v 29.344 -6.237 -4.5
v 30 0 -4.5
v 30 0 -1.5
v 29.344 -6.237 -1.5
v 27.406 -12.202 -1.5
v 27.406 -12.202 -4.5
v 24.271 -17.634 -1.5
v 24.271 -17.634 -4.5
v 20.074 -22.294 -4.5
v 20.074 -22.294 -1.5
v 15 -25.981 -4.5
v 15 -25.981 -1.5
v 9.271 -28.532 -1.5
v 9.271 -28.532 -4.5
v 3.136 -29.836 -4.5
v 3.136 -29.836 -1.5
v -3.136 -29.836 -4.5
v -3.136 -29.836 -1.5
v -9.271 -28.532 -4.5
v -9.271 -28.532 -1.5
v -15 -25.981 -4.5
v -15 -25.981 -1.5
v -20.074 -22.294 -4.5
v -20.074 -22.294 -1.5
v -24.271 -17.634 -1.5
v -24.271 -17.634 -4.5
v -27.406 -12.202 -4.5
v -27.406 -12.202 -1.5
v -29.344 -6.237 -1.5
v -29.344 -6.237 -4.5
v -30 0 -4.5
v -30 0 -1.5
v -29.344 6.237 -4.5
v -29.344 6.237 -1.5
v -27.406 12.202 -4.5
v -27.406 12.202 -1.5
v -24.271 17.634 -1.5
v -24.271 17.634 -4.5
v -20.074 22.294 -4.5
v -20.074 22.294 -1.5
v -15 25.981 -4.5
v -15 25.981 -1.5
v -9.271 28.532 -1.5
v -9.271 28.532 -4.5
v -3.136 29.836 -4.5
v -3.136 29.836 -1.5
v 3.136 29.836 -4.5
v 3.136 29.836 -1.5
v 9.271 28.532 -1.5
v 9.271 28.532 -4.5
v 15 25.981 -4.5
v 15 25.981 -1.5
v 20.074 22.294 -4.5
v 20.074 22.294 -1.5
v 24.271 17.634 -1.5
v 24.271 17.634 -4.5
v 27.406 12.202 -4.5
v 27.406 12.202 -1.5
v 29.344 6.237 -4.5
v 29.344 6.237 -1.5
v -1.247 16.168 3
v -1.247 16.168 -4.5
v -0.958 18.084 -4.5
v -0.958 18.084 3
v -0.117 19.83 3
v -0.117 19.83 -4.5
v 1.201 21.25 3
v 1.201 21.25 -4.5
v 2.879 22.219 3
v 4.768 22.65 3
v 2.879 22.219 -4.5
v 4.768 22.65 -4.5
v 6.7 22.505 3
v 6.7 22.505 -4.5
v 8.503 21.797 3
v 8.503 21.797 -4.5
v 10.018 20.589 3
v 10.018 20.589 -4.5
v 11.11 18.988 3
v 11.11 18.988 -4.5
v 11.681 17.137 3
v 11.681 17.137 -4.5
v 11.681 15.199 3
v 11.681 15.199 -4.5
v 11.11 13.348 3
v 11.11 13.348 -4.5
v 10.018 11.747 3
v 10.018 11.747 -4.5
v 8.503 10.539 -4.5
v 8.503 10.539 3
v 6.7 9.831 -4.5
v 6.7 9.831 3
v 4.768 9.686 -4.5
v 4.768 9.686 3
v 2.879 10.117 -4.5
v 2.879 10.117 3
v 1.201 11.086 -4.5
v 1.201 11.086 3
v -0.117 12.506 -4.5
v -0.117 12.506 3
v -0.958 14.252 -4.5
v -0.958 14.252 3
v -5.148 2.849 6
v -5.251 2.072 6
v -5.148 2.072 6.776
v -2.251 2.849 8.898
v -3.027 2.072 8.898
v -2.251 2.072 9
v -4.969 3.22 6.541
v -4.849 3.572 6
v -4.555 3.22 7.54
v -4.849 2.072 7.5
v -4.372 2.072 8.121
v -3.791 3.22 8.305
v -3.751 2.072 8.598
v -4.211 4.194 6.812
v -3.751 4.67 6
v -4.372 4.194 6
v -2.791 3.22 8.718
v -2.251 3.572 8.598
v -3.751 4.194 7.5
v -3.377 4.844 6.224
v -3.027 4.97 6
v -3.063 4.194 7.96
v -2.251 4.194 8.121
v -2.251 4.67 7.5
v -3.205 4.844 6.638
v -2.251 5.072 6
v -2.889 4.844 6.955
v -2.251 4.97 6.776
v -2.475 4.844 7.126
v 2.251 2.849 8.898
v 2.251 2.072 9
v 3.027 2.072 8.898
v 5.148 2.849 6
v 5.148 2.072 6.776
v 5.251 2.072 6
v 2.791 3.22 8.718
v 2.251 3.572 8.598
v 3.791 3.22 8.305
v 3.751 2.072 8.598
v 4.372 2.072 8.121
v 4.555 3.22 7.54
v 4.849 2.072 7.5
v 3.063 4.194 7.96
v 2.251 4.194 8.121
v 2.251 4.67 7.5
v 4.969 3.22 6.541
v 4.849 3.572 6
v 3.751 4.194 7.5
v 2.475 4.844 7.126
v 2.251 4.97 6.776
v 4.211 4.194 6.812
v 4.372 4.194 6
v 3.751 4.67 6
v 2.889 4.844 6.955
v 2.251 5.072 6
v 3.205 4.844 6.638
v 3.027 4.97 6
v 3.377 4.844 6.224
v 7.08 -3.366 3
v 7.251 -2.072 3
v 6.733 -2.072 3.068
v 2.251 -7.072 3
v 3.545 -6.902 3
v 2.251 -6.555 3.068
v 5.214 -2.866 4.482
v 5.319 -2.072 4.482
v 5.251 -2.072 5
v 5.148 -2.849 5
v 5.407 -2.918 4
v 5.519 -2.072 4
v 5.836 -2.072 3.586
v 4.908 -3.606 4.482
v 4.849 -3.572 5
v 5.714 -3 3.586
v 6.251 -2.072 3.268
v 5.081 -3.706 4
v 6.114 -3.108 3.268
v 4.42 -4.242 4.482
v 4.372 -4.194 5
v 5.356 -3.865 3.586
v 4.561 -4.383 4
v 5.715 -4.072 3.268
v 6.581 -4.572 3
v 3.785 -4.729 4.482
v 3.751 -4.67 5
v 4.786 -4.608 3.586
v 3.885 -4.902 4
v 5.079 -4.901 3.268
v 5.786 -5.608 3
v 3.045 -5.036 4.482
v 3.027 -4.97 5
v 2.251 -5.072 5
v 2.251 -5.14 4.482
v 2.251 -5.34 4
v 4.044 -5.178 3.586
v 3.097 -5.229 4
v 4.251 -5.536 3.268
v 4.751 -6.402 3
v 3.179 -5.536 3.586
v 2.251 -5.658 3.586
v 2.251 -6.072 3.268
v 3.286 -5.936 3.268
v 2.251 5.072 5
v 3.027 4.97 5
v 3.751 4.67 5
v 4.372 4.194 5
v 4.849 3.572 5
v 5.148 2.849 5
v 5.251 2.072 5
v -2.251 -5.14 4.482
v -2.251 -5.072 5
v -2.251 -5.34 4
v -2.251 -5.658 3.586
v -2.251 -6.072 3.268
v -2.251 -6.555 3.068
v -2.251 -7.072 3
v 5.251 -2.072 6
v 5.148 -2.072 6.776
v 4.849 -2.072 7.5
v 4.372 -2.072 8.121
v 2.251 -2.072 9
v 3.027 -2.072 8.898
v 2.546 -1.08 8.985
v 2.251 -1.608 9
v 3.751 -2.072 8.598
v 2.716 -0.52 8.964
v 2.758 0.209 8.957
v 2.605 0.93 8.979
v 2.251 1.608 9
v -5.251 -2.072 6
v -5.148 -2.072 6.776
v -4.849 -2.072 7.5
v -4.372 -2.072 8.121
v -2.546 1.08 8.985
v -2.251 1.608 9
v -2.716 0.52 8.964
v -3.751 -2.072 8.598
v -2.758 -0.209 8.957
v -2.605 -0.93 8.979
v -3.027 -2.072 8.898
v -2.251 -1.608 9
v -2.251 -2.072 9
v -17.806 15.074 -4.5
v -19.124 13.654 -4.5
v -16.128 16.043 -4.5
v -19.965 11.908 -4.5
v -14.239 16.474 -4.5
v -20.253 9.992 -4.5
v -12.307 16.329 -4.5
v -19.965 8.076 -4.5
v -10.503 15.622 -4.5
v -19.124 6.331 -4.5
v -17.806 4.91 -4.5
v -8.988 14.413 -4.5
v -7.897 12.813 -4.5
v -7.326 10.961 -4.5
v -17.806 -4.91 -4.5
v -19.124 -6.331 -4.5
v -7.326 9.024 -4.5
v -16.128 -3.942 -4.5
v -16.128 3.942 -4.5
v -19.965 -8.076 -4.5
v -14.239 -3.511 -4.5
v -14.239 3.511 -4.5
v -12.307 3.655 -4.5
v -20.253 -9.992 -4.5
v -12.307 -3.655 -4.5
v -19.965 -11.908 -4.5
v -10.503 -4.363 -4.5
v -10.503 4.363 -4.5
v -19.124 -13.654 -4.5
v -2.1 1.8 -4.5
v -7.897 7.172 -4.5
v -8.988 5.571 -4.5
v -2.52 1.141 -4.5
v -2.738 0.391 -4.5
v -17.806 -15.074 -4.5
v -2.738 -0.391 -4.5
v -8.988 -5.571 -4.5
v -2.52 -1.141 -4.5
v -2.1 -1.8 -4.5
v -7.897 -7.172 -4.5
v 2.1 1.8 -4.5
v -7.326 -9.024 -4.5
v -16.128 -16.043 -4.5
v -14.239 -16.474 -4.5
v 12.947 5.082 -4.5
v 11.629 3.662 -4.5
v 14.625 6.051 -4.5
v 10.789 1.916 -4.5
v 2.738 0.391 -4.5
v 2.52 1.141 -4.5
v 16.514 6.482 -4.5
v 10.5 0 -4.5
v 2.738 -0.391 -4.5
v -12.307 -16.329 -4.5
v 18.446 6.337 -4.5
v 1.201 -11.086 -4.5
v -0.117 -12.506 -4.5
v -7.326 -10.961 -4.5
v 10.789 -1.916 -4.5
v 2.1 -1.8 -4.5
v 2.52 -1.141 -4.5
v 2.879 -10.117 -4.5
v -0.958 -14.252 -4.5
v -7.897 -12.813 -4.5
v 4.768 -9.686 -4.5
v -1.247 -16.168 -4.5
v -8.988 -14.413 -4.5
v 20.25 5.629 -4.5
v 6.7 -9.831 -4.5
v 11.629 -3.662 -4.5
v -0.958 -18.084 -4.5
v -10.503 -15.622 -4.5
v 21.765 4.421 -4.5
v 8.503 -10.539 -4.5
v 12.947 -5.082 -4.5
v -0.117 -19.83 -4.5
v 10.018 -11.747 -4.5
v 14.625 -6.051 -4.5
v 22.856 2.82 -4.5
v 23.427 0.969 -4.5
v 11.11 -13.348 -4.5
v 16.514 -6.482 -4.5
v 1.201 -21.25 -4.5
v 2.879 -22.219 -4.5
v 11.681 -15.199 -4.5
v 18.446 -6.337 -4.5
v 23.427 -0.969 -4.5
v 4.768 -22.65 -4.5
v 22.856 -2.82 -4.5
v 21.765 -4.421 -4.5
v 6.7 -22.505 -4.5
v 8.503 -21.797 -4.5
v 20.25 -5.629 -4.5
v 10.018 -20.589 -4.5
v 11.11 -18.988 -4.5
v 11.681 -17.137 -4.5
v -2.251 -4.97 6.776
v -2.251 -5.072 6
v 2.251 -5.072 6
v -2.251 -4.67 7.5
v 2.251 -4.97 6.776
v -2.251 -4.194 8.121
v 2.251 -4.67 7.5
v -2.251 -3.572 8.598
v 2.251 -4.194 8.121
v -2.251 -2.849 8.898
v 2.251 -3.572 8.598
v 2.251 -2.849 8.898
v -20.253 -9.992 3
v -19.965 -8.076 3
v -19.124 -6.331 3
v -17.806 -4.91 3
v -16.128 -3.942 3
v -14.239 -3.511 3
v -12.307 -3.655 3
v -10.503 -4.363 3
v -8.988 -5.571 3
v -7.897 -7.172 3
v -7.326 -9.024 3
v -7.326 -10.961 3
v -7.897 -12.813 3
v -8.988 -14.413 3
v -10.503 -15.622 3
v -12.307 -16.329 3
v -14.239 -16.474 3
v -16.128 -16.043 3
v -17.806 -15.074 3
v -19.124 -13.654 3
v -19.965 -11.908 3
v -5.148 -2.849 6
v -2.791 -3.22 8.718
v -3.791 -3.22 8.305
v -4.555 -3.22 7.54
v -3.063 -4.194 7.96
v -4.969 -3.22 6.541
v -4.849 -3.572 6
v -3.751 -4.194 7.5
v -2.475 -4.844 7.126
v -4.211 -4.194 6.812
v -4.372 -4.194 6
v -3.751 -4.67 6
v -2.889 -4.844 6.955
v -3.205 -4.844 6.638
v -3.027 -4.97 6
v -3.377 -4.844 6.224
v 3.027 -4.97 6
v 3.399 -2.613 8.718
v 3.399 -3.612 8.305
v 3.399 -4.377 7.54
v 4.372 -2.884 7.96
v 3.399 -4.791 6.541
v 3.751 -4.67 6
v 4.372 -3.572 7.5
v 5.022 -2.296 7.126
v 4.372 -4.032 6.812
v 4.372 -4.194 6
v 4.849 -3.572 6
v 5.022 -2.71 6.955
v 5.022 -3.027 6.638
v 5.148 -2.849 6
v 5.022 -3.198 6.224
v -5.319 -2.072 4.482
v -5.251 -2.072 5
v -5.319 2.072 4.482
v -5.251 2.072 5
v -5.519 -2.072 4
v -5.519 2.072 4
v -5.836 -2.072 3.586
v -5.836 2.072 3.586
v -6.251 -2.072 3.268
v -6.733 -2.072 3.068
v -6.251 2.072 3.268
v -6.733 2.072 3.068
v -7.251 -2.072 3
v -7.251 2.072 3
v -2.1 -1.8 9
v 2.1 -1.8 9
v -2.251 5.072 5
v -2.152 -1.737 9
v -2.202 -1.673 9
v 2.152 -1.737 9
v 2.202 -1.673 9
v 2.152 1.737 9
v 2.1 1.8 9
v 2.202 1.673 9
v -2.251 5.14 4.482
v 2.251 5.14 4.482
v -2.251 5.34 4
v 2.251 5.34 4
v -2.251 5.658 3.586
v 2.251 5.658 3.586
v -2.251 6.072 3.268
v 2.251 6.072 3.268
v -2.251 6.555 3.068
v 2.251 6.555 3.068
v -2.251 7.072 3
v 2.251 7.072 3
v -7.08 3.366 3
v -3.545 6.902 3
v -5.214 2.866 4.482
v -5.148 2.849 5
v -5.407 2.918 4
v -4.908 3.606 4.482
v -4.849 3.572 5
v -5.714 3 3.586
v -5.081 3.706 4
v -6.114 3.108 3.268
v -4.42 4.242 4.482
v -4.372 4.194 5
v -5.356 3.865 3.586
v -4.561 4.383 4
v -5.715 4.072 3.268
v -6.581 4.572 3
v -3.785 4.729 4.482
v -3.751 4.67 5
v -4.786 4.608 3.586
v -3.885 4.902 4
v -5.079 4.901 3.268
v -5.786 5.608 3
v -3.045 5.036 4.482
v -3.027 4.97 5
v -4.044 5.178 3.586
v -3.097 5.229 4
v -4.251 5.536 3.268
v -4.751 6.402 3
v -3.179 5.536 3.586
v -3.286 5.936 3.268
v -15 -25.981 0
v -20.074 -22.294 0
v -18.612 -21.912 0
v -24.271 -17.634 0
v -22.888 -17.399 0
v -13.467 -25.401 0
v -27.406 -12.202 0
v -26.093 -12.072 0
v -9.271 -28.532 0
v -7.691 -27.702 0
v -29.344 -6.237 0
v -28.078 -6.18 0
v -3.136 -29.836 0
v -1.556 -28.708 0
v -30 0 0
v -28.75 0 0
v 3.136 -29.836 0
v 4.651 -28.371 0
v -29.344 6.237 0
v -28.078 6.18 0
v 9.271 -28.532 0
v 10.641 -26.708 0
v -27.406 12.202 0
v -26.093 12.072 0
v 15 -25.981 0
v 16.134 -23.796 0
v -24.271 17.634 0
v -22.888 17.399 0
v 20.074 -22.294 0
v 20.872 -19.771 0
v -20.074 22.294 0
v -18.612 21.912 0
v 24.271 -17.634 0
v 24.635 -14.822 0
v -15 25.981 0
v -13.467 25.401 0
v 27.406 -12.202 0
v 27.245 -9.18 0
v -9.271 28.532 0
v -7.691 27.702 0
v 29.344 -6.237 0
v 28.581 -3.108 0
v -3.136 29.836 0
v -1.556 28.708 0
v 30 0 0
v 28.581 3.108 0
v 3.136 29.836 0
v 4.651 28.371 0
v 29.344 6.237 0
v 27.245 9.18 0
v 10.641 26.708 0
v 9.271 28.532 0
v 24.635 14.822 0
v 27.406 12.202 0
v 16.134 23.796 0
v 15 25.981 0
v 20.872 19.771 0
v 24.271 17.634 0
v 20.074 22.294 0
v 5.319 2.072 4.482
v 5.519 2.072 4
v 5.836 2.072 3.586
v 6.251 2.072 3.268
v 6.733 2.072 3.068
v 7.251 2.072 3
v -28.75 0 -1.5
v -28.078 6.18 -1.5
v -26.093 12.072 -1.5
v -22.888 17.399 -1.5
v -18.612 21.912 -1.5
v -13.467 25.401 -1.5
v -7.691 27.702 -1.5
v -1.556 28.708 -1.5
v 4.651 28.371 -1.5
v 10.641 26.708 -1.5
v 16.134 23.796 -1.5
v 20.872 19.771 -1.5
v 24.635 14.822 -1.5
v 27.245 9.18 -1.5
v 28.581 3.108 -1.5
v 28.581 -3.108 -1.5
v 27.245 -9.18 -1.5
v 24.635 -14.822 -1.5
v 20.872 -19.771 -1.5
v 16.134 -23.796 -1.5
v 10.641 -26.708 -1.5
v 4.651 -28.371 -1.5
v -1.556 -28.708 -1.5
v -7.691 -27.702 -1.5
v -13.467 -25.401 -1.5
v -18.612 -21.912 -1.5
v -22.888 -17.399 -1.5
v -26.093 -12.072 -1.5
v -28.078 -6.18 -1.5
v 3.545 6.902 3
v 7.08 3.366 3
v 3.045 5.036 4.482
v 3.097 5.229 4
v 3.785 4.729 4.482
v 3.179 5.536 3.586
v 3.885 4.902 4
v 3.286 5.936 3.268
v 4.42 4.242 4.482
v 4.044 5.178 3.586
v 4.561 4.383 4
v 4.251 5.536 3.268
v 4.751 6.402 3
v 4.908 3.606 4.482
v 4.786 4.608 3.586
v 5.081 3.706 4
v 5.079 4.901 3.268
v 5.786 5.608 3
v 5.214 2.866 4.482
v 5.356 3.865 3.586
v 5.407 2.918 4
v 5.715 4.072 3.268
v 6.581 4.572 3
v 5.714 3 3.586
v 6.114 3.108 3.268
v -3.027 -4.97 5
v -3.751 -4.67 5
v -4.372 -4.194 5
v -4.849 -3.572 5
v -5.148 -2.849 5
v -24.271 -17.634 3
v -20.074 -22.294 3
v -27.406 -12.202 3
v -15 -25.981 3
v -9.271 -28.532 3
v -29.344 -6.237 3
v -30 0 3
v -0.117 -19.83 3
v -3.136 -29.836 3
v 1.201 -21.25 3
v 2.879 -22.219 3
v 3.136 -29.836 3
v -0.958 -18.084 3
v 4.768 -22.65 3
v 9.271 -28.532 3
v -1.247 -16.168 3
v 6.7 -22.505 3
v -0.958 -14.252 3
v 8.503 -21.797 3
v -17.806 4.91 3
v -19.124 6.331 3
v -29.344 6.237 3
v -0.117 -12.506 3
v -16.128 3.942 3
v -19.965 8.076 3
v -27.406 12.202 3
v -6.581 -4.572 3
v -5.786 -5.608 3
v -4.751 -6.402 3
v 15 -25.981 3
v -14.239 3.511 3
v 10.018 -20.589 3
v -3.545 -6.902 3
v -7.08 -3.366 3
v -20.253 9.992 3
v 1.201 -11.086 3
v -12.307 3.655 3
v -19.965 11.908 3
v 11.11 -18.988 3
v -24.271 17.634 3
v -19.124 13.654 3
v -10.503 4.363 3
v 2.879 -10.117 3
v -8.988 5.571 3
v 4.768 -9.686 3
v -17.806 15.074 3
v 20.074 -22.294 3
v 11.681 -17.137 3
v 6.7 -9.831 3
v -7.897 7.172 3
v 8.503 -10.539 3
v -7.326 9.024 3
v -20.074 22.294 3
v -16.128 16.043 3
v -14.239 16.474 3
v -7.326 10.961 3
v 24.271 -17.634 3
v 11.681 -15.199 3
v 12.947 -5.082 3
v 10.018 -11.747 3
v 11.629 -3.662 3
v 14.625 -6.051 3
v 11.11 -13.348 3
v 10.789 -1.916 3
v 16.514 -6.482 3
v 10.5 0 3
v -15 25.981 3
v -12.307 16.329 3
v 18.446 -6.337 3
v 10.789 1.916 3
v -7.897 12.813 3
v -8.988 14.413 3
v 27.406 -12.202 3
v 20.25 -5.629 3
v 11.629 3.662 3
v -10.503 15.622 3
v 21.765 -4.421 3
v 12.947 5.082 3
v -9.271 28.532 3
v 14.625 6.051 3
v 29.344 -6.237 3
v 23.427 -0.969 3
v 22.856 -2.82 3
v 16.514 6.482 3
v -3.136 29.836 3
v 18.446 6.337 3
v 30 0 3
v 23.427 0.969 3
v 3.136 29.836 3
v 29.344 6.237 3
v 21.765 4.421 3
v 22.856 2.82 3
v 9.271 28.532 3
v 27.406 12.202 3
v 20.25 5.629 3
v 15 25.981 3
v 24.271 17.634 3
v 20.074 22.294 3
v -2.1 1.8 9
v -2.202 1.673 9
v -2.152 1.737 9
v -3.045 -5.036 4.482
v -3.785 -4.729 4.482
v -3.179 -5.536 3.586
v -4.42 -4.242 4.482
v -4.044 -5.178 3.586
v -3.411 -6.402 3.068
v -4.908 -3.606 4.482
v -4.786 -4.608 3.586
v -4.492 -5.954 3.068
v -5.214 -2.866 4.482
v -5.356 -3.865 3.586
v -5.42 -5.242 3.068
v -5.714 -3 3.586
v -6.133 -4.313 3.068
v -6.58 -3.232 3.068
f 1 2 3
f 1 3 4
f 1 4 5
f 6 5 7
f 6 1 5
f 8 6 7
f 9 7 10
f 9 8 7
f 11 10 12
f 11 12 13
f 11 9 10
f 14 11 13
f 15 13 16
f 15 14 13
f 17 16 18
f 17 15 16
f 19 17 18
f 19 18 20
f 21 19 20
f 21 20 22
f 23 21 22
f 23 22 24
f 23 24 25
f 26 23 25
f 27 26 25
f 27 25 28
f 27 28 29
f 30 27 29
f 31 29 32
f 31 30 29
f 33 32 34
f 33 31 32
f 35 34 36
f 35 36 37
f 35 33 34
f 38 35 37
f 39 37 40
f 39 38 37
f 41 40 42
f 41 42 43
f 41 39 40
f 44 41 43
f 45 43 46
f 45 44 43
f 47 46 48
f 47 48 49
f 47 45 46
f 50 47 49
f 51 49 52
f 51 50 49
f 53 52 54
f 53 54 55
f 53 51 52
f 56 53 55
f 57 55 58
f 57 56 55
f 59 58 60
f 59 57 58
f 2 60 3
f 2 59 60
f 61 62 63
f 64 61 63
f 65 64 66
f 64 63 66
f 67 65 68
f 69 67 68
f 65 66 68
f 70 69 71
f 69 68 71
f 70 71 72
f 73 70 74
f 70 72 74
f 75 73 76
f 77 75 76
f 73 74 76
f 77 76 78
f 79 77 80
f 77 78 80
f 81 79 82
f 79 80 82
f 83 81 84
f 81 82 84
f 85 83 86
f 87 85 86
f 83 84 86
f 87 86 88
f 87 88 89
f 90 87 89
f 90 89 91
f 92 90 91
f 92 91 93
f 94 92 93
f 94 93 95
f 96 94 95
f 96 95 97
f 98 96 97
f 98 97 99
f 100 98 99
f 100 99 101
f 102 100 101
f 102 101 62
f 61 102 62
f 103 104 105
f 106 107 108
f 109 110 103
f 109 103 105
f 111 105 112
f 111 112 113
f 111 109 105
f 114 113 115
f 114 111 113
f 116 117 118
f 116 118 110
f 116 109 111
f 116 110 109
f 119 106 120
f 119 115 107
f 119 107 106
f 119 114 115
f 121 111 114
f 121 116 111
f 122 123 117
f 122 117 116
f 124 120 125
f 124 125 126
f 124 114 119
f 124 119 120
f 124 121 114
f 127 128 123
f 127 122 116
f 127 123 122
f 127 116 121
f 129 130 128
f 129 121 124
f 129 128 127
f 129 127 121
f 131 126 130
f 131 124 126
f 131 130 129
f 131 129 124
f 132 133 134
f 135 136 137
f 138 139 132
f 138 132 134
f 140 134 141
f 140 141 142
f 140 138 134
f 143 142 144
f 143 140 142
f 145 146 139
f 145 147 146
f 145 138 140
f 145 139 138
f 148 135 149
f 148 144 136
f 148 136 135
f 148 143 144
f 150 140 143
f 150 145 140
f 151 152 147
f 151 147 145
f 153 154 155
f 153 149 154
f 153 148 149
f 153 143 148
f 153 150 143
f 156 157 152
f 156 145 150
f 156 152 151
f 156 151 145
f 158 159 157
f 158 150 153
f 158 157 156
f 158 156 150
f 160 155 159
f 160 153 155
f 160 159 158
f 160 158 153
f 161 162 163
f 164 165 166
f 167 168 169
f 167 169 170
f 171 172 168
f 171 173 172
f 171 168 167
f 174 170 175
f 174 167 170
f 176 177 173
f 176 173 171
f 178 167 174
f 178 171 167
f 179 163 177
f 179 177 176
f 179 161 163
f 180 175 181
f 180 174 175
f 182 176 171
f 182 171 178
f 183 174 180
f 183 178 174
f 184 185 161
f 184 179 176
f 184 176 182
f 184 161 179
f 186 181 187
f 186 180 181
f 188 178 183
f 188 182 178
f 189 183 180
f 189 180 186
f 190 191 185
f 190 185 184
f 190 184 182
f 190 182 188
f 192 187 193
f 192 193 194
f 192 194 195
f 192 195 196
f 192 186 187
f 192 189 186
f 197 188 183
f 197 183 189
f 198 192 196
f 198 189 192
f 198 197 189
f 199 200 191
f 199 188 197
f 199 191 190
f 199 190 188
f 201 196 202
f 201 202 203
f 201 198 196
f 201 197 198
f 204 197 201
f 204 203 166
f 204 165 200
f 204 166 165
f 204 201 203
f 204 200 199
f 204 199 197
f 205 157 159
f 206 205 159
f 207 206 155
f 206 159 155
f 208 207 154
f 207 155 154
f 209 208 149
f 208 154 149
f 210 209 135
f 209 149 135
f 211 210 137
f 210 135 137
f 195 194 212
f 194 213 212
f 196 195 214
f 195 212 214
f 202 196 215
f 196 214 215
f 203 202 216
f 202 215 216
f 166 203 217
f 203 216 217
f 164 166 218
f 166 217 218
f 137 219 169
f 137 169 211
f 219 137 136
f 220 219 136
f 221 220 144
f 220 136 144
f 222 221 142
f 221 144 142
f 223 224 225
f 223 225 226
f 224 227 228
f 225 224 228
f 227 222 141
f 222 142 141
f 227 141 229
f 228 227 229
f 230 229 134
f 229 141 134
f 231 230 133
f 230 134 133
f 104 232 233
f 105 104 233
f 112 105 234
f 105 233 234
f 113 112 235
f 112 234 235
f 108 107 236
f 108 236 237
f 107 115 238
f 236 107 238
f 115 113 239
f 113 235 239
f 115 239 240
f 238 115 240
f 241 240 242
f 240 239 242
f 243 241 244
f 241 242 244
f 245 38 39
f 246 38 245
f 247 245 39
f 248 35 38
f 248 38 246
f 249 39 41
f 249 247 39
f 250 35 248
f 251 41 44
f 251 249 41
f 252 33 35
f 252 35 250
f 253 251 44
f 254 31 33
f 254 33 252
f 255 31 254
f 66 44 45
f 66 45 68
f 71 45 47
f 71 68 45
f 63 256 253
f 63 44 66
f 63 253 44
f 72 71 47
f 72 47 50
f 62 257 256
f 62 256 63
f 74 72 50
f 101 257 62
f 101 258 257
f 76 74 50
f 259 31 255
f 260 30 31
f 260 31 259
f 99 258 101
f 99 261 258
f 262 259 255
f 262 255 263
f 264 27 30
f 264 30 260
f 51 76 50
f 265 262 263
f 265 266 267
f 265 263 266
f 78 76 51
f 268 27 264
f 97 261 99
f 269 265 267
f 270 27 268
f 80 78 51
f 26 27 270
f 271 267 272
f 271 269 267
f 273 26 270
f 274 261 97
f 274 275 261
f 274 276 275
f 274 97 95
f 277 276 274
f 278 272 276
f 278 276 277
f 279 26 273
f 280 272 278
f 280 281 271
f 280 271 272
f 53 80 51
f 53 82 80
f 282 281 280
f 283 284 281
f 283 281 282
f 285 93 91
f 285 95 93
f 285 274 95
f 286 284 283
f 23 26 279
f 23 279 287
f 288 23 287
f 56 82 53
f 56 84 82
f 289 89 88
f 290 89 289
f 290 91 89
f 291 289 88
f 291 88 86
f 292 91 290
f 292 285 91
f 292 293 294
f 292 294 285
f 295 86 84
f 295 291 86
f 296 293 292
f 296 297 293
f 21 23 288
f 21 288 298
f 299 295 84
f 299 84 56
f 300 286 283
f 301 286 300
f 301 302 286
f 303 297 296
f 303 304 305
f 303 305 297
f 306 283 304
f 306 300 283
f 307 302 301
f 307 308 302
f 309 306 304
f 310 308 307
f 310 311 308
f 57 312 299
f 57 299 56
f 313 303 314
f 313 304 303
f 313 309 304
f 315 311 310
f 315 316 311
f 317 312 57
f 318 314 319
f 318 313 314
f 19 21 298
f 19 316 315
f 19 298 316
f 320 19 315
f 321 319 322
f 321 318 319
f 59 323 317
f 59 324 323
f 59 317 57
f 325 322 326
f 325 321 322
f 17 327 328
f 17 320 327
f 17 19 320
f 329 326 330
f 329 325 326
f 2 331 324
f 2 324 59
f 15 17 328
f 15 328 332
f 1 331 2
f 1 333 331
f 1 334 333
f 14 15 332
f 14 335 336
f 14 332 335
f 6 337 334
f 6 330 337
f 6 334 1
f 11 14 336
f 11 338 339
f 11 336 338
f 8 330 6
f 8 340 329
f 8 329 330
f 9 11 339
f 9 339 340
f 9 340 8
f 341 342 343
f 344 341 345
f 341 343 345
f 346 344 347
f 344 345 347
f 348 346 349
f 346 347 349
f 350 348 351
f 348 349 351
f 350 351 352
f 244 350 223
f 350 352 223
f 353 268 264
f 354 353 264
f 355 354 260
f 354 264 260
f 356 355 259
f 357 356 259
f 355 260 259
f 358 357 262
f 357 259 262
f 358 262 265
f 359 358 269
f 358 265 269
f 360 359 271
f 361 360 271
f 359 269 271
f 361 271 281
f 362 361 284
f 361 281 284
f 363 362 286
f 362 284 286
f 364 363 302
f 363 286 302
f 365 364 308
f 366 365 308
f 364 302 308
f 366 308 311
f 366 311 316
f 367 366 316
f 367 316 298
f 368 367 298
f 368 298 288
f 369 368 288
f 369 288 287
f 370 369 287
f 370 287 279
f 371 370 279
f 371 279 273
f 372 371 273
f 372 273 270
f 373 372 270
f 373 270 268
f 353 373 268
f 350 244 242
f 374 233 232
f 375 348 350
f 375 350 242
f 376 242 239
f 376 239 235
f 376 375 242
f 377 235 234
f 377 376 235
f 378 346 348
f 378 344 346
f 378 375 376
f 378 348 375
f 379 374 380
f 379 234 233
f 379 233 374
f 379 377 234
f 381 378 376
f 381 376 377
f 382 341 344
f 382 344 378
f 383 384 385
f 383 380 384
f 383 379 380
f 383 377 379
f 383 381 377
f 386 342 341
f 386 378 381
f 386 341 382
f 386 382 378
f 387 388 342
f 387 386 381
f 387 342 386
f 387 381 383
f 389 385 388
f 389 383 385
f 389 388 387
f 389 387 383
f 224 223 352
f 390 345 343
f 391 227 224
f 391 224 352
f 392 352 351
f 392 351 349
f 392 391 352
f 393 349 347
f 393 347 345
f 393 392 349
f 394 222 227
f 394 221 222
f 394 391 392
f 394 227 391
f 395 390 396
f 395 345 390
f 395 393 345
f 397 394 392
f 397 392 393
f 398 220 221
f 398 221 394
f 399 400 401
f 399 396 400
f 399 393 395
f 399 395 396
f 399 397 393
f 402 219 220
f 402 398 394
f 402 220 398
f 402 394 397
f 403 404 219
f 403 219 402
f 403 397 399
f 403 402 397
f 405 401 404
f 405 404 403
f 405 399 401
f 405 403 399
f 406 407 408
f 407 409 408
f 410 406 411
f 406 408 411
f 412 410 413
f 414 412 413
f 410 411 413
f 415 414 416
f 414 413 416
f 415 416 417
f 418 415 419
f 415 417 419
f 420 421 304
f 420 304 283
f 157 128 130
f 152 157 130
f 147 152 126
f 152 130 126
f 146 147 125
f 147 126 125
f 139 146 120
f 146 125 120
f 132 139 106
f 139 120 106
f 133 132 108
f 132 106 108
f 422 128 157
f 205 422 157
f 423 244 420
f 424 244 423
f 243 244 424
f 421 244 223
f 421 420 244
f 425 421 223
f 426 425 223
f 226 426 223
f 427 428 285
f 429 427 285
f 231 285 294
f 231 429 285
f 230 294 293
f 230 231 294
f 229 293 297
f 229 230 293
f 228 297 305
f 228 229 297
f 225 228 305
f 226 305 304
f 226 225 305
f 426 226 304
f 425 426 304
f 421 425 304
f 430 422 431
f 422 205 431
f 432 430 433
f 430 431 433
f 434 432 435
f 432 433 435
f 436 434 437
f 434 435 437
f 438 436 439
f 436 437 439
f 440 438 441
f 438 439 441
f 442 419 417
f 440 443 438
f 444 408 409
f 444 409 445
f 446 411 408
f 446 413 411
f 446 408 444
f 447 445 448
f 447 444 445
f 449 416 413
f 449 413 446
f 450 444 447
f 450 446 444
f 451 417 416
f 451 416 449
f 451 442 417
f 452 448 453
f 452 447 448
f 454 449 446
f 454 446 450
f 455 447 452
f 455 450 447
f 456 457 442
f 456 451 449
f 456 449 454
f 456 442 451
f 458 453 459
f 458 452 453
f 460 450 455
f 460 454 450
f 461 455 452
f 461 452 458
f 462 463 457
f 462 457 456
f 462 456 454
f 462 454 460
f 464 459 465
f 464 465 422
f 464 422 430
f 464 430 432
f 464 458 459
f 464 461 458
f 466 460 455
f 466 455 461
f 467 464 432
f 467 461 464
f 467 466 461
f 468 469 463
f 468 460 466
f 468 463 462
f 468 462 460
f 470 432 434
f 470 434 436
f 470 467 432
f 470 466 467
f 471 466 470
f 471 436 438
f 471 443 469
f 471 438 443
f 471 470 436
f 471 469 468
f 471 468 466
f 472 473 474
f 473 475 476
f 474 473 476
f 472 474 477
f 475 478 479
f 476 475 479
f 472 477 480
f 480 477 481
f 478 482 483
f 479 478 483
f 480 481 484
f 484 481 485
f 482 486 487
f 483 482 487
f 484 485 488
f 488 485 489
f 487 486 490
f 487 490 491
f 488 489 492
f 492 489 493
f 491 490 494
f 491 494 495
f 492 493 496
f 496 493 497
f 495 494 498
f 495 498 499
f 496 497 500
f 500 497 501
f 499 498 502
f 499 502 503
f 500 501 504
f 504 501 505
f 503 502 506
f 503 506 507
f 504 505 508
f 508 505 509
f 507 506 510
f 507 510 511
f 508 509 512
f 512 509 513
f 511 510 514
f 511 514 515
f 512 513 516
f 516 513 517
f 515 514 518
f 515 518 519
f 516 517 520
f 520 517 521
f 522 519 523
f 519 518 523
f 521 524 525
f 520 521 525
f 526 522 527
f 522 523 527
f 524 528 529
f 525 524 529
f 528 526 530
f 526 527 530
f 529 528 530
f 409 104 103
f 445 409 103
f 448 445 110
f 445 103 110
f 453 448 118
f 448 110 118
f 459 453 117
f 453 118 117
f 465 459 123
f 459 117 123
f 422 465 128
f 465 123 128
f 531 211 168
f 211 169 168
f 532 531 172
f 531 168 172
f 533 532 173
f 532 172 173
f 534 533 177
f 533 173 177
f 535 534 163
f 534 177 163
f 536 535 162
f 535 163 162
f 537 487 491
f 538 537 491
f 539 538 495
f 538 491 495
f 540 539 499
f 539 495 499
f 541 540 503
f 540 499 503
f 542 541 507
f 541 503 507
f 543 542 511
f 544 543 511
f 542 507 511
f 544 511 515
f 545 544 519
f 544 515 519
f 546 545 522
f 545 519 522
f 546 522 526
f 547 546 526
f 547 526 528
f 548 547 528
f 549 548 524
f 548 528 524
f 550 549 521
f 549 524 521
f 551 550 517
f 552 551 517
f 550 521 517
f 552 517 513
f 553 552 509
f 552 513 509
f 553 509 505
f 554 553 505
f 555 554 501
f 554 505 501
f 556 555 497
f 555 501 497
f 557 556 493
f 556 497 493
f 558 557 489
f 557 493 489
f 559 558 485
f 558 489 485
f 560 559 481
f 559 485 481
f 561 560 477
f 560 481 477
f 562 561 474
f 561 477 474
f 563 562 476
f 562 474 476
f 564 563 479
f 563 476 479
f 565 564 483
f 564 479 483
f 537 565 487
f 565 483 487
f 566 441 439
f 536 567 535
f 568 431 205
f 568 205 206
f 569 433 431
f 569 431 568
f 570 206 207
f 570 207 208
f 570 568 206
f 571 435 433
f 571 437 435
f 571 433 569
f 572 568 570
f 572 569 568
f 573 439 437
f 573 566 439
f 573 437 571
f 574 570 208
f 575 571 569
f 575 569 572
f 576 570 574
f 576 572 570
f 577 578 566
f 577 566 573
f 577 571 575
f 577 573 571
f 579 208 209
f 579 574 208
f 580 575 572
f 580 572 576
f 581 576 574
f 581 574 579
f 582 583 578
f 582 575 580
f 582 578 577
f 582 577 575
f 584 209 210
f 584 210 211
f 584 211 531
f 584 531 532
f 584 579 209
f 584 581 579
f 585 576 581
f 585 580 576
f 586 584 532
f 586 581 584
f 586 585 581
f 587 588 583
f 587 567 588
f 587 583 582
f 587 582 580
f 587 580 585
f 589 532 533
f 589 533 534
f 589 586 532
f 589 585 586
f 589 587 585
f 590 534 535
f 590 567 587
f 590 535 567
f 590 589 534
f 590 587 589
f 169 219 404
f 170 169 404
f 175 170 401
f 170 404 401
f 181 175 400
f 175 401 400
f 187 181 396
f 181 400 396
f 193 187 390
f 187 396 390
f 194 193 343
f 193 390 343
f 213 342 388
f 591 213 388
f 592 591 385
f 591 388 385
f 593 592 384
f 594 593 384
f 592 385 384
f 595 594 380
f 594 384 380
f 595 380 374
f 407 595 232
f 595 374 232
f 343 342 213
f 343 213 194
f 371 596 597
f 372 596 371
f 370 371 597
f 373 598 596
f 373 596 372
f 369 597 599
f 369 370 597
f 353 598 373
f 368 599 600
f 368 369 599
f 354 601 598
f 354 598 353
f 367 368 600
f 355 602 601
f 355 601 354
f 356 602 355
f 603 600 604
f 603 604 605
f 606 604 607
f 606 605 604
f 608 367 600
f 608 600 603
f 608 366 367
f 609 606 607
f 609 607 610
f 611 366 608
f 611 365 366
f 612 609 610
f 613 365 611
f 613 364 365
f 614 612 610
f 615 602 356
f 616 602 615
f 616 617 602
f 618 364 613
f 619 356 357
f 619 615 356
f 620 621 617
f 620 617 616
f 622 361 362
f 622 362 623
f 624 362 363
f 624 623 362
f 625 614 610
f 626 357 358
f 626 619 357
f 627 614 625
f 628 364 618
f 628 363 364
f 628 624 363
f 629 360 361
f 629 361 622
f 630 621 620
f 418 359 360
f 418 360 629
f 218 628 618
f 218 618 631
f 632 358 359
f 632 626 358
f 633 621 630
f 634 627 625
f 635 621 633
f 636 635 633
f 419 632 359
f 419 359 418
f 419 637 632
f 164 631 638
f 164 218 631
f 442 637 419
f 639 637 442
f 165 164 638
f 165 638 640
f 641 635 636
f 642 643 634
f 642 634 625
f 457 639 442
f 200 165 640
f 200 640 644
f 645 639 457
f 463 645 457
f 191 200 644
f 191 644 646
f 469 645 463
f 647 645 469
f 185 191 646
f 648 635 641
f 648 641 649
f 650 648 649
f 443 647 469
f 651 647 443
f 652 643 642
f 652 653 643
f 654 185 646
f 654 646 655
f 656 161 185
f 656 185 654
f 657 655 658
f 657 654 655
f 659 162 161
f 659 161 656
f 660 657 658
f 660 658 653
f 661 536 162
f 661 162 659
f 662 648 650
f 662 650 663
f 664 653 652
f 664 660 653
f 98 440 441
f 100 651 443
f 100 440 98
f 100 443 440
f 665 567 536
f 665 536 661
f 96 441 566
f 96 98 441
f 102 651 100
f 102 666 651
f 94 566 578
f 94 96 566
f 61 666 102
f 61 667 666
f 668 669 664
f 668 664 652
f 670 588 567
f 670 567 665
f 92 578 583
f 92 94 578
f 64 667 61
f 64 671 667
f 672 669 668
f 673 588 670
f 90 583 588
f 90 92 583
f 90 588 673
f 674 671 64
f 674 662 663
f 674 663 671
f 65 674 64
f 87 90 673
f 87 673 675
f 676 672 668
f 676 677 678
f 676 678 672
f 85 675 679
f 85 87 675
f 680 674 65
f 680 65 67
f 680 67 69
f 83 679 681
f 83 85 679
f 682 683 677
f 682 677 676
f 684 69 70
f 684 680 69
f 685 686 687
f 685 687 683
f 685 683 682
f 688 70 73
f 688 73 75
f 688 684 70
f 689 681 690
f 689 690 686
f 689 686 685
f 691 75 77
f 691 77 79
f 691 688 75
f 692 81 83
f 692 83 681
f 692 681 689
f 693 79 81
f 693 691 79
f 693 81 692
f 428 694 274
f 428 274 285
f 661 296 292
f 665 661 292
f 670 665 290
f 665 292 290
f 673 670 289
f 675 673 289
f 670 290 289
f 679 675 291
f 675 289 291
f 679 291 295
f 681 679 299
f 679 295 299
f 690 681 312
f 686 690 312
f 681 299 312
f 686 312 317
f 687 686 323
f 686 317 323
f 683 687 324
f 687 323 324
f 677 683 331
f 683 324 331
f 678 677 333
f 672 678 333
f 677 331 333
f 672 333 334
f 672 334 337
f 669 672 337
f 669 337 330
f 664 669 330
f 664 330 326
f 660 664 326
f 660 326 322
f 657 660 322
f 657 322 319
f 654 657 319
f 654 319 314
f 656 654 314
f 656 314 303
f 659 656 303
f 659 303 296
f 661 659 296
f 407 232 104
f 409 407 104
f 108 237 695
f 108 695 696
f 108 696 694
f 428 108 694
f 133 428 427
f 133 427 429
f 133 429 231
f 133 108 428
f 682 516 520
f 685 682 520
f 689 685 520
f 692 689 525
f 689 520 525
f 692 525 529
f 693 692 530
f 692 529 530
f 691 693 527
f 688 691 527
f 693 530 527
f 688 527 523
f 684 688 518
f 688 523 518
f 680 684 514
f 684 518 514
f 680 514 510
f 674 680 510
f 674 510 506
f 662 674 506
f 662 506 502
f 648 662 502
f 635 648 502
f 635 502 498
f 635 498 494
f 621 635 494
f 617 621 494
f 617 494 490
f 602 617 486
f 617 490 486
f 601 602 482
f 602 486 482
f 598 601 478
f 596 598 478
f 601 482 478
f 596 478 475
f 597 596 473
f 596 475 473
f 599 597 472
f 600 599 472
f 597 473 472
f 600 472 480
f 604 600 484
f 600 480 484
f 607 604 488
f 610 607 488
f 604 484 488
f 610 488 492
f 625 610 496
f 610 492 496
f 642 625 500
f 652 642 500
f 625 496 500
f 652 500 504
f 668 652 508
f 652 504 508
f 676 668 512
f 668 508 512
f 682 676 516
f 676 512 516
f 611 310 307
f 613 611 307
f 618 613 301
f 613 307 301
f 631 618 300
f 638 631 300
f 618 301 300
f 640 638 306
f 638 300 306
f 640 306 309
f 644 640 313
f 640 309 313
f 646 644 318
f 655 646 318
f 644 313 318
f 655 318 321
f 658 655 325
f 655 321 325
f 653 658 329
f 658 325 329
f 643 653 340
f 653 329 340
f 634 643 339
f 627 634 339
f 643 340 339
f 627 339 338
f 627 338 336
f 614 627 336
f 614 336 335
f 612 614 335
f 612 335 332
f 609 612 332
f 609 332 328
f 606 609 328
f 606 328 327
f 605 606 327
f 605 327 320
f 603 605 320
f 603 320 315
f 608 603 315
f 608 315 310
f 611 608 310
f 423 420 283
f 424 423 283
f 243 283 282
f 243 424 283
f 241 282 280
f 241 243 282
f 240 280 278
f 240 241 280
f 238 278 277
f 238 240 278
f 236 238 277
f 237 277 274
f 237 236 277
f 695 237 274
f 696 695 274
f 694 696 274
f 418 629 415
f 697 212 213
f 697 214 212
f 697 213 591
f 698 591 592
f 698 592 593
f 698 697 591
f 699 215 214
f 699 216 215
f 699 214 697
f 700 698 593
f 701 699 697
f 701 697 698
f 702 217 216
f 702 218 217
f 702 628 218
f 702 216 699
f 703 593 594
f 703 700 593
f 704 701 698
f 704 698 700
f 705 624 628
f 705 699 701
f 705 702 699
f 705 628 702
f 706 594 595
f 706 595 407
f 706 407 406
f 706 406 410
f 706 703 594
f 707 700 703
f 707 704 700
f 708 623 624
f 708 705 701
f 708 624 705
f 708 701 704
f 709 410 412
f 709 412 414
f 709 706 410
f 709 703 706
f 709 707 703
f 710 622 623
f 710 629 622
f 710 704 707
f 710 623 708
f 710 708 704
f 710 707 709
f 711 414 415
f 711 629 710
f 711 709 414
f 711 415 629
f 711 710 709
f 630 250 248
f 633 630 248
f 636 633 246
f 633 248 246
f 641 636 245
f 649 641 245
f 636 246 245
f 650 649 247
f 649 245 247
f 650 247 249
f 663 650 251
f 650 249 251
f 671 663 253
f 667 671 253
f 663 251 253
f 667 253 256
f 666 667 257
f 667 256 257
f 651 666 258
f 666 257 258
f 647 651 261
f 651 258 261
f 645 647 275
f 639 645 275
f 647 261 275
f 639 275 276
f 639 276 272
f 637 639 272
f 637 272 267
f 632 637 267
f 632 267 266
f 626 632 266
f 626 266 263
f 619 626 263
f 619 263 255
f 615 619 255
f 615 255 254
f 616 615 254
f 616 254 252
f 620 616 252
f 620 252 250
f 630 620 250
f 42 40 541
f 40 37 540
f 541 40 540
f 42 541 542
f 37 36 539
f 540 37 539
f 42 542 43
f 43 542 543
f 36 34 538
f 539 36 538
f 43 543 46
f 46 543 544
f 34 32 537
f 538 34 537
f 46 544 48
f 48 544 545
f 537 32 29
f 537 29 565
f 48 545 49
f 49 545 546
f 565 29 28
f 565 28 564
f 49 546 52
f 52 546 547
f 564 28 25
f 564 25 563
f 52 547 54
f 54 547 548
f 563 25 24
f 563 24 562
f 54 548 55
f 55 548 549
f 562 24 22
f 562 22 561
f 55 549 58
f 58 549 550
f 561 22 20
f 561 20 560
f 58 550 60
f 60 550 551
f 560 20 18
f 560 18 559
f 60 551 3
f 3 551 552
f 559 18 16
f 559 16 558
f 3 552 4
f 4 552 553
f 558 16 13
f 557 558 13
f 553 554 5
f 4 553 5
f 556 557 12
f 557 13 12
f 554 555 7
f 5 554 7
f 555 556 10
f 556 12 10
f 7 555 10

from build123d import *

# Parameters (mm, degrees)
ESQUISSE2_R             = 30
BOSS_EXTRU_1_DEPTH      = 3
ENL_V_MAT_EXTRU_1_DEPTH = 43.532340636
BOSS_EXTRU_3_START      = 6
ESQUISSE5_W             = 10.501413836
ESQUISSE5_H             = 10.144569676
BOSS_EXTRU_3_DEPTH      = 6
ESQUISSE8_R             = 28.75
BOSS_EXTRU_4_DEPTH      = 1.5
BOSS_EXTRU_5_START      = 3
ESQUISSE9_R             = 30
BOSS_EXTRU_5_DEPTH      = 3
ENL_V_MAT_EXTRU_4_DEPTH = 44.370496884
CONG_1_R                = 3
CONG_2_R                = 2
ESQUISSE11_R            = 6.5
AJOURAGE_DEPTH          = 45.522466269


with BuildPart() as part:
    # Esquisse2 → Boss.-Extru.1 (new body)
    with BuildSketch(Plane.XY):
        Circle(ESQUISSE2_R)
    extrude(amount=BOSS_EXTRU_1_DEPTH)

    # Esquisse4 → Enlèv. mat.-Extru.1 (cut, through all)
    with BuildSketch(Plane.XY.offset(3)):
        with BuildLine():
            Line((-2.1, -1.8), (2.1, -1.8))
            ThreePointArc((2.1, -1.8), (2.765863337, 0), (2.1, 1.8))
            Line((2.1, 1.8), (-2.1, 1.8))
            ThreePointArc((-2.1, 1.8), (-2.765863337, 0), (-2.1, -1.8))
        make_face()
    extrude(amount=-ENL_V_MAT_EXTRU_1_DEPTH, mode=Mode.SUBTRACT)

    # Esquisse5 → Boss.-Extru.3 (add)
    with BuildSketch(Plane.XY.offset(3).offset(BOSS_EXTRU_3_START)):
        Rectangle(ESQUISSE5_W, ESQUISSE5_H)
        with BuildLine():
            Line((-2.1, 1.8), (2.1, 1.8))
            ThreePointArc((2.1, 1.8), (2.765863337, 0), (2.1, -1.8))
            Line((2.1, -1.8), (-2.1, -1.8))
            ThreePointArc((-2.1, -1.8), (-2.765863337, 0), (-2.1, 1.8))
        make_face(mode=Mode.SUBTRACT)
    extrude(amount=-BOSS_EXTRU_3_DEPTH)

    # Esquisse8 → Boss.-Extru.4 (add)
    with BuildSketch(Plane(origin=(0, 0, 0), x_dir=(-1, 0, 0), z_dir=(0, 0, -1))):
        Circle(ESQUISSE8_R)
    extrude(amount=BOSS_EXTRU_4_DEPTH)

    # Esquisse9 → Boss.-Extru.5 (add)
    with BuildSketch(Plane(origin=(0, 0, -1.5), x_dir=(-1, 0, 0), z_dir=(0, 0, -1)).offset(BOSS_EXTRU_5_START)):
        with Locations(Location((0, 0, 0), (0, 0, 180))):
            Circle(ESQUISSE9_R)
    extrude(amount=-BOSS_EXTRU_5_DEPTH)

    # Esquisse10 → Enlèv. mat.-Extru.4 (cut, through all)
    with BuildSketch(Plane.XY):
        with BuildLine():
            Line((-2.1, 1.8), (2.1, 1.8))
            ThreePointArc((2.1, 1.8), (2.765863337, 0), (2.1, -1.8))
            Line((2.1, -1.8), (-2.1, -1.8))
            ThreePointArc((-2.1, -1.8), (-2.765863337, 0), (-2.1, 1.8))
        make_face()
    extrude(amount=-ENL_V_MAT_EXTRU_4_DEPTH, mode=Mode.SUBTRACT)

    # Congé1
    # the kernel refuses this fillet: 3 mm, written as the material it takes off along each edge
    with BuildSketch(Plane(origin=(-2.250706918, -2.072284838, 6), x_dir=(-1, 0, 0), z_dir=(0, -1, 0))) as cong_1_piece_1_section:
        Polygon((0, 0), (CONG_1_R, 0), (CONG_1_R, -CONG_1_R), (0, -CONG_1_R), align=None)
    cong_1_piece_1 = extrude(amount=CONG_1_R, mode=Mode.PRIVATE)
    cong_1_piece_1 = cong_1_piece_1 - Plane(origin=(-2.250706918, -2.072284838, 6), x_dir=(0.7071067811865475, 0, -0.7071067811865475), z_dir=(0, -1, 0)) * Sphere(CONG_1_R, mode=Mode.PRIVATE)
    add(cong_1_piece_1, mode=Mode.SUBTRACT)
    with BuildSketch(Plane(origin=(-2.250706918, 2.072284838, 6), x_dir=(-1, 0, 0), z_dir=(0, 1, 0))) as cong_1_piece_2_section:
        Polygon((0, 0), (CONG_1_R, 0), (CONG_1_R, CONG_1_R), (0, CONG_1_R), align=None)
    cong_1_piece_2 = extrude(amount=CONG_1_R, mode=Mode.PRIVATE)
    cong_1_piece_2 = cong_1_piece_2 - Plane(origin=(-2.250706918, 2.072284838, 6), x_dir=(0.7071067811865475, 0, -0.7071067811865475), z_dir=(0, 1, 0)) * Sphere(CONG_1_R, mode=Mode.PRIVATE)
    add(cong_1_piece_2, mode=Mode.SUBTRACT)
    with BuildSketch(Plane(origin=(2.250706918, -2.072284838, 6), x_dir=(0, -1, 0), z_dir=(1, 0, 0))) as cong_1_piece_3_section:
        Polygon((0, 0), (CONG_1_R, 0), (CONG_1_R, -CONG_1_R), (0, -CONG_1_R), align=None)
    cong_1_piece_3 = extrude(amount=CONG_1_R, mode=Mode.PRIVATE)
    cong_1_piece_3 = cong_1_piece_3 - Plane(origin=(2.250706918, -2.072284838, 6), x_dir=(0, 0.7071067811865475, -0.7071067811865475), z_dir=(1, 0, 0)) * Sphere(CONG_1_R, mode=Mode.PRIVATE)
    add(cong_1_piece_3, mode=Mode.SUBTRACT)
    with BuildSketch(Plane(origin=(2.250706918, 2.072284838, 6), x_dir=(1, 0, 0), z_dir=(0, 1, 0))) as cong_1_piece_4_section:
        Polygon((0, 0), (CONG_1_R, 0), (CONG_1_R, -CONG_1_R), (0, -CONG_1_R), align=None)
    cong_1_piece_4 = extrude(amount=CONG_1_R, mode=Mode.PRIVATE)
    cong_1_piece_4 = cong_1_piece_4 - Plane(origin=(2.250706918, 2.072284838, 6), x_dir=(-0.7071067811865475, 0, -0.7071067811865475), z_dir=(0, 1, 0)) * Sphere(CONG_1_R, mode=Mode.PRIVATE)
    add(cong_1_piece_4, mode=Mode.SUBTRACT)
    with BuildSketch(Plane(origin=(-5.250706918, -2.072284838, 9), x_dir=(0, 0, -1), z_dir=(0, 1, 0))) as cong_1_piece_5:
        with BuildLine():
            CenterArc((CONG_1_R, -CONG_1_R), CONG_1_R, 90, 90)
            Line((0, -CONG_1_R), (0, 0))
            Line((0, 0), (CONG_1_R, 0))
        make_face()
    extrude(amount=4.144569676, mode=Mode.SUBTRACT)
    with BuildSketch(Plane(origin=(-5.250706918, 5.072284838, 6), x_dir=(0, -1, 0), z_dir=(0, 0, -1)), Plane(origin=(5.250706918, -5.072284838, 6), x_dir=(0, 1, 0), z_dir=(0, 0, -1)), Plane(origin=(5.250706918, 5.072284838, 6), x_dir=(-1, 0, 0), z_dir=(0, 0, -1))) as cong_1_piece_6:
        with BuildLine():
            CenterArc((CONG_1_R, -CONG_1_R), CONG_1_R, 90, 90)
            Line((0, -CONG_1_R), (0, 0))
            Line((0, 0), (CONG_1_R, 0))
        make_face()
    extrude(amount=3, mode=Mode.SUBTRACT)
    with BuildSketch(Plane(origin=(2.250706918, -5.072284838, 9), x_dir=(0, 1, 0), z_dir=(-1, 0, 0)), Plane(origin=(-2.250706918, 5.072284838, 9), x_dir=(0, -1, 0), z_dir=(1, 0, 0))) as cong_1_piece_7:
        with BuildLine():
            CenterArc((CONG_1_R, CONG_1_R), CONG_1_R, 180, 90)
            Line((0, CONG_1_R), (0, 0))
            Line((0, 0), (CONG_1_R, 0))
        make_face()
    extrude(amount=4.501413836, mode=Mode.SUBTRACT)
    with BuildSketch(Plane(origin=(-5.250706918, -5.072284838, 6), x_dir=(0, 1, 0), z_dir=(0, 0, -1))) as cong_1_piece_8:
        with BuildLine():
            CenterArc((CONG_1_R, CONG_1_R), CONG_1_R, 180, 90)
            Line((0, CONG_1_R), (0, 0))
            Line((0, 0), (CONG_1_R, 0))
        make_face()
    extrude(amount=3, mode=Mode.SUBTRACT)
    with BuildSketch(Plane(origin=(5.250706918, 2.072284838, 9), x_dir=(-1, 0, 0), z_dir=(0, -1, 0))) as cong_1_piece_9:
        with BuildLine():
            CenterArc((CONG_1_R, CONG_1_R), CONG_1_R, 180, 90)
            Line((0, CONG_1_R), (0, 0))
            Line((0, 0), (CONG_1_R, 0))
        make_face()
    extrude(amount=4.144569676, mode=Mode.SUBTRACT)

    # Congé2
    cong_2_edges = [part.edges().sort_by_distance(p)[0] for p in [
        (-5.250706918, 0, 3),
        (0, 5.072284838, 3),
        (0, -5.072284838, 3),
        (5.250706918, 0, 3),
        (-4.372027261, 4.193605182, 3),
        (-4.372027261, -4.193605182, 3),
        (4.372027261, -4.193605182, 3),
        (4.372027261, 4.193605182, 3),
    ]]
    fillet(cong_2_edges, radius=CONG_2_R)

    # Esquisse11 → Ajourage (cut, through all)
    with BuildSketch(Plane(origin=(0, 0, -4.5), x_dir=(-1, 0, 0), z_dir=(0, 0, -1))):
        with Locations((-17, 0)):
            Circle(ESQUISSE11_R)
        with Locations((-5.253288904, 16.167960777)):
            Circle(ESQUISSE11_R)
        with Locations((13.753288904, 9.992349289)):
            Circle(ESQUISSE11_R)
        with Locations((13.753288904, -9.992349289)):
            Circle(ESQUISSE11_R)
        with Locations((-5.253288904, -16.167960777)):
            Circle(ESQUISSE11_R)
    extrude(amount=-AJOURAGE_DEPTH, mode=Mode.SUBTRACT)


solid = part.part
